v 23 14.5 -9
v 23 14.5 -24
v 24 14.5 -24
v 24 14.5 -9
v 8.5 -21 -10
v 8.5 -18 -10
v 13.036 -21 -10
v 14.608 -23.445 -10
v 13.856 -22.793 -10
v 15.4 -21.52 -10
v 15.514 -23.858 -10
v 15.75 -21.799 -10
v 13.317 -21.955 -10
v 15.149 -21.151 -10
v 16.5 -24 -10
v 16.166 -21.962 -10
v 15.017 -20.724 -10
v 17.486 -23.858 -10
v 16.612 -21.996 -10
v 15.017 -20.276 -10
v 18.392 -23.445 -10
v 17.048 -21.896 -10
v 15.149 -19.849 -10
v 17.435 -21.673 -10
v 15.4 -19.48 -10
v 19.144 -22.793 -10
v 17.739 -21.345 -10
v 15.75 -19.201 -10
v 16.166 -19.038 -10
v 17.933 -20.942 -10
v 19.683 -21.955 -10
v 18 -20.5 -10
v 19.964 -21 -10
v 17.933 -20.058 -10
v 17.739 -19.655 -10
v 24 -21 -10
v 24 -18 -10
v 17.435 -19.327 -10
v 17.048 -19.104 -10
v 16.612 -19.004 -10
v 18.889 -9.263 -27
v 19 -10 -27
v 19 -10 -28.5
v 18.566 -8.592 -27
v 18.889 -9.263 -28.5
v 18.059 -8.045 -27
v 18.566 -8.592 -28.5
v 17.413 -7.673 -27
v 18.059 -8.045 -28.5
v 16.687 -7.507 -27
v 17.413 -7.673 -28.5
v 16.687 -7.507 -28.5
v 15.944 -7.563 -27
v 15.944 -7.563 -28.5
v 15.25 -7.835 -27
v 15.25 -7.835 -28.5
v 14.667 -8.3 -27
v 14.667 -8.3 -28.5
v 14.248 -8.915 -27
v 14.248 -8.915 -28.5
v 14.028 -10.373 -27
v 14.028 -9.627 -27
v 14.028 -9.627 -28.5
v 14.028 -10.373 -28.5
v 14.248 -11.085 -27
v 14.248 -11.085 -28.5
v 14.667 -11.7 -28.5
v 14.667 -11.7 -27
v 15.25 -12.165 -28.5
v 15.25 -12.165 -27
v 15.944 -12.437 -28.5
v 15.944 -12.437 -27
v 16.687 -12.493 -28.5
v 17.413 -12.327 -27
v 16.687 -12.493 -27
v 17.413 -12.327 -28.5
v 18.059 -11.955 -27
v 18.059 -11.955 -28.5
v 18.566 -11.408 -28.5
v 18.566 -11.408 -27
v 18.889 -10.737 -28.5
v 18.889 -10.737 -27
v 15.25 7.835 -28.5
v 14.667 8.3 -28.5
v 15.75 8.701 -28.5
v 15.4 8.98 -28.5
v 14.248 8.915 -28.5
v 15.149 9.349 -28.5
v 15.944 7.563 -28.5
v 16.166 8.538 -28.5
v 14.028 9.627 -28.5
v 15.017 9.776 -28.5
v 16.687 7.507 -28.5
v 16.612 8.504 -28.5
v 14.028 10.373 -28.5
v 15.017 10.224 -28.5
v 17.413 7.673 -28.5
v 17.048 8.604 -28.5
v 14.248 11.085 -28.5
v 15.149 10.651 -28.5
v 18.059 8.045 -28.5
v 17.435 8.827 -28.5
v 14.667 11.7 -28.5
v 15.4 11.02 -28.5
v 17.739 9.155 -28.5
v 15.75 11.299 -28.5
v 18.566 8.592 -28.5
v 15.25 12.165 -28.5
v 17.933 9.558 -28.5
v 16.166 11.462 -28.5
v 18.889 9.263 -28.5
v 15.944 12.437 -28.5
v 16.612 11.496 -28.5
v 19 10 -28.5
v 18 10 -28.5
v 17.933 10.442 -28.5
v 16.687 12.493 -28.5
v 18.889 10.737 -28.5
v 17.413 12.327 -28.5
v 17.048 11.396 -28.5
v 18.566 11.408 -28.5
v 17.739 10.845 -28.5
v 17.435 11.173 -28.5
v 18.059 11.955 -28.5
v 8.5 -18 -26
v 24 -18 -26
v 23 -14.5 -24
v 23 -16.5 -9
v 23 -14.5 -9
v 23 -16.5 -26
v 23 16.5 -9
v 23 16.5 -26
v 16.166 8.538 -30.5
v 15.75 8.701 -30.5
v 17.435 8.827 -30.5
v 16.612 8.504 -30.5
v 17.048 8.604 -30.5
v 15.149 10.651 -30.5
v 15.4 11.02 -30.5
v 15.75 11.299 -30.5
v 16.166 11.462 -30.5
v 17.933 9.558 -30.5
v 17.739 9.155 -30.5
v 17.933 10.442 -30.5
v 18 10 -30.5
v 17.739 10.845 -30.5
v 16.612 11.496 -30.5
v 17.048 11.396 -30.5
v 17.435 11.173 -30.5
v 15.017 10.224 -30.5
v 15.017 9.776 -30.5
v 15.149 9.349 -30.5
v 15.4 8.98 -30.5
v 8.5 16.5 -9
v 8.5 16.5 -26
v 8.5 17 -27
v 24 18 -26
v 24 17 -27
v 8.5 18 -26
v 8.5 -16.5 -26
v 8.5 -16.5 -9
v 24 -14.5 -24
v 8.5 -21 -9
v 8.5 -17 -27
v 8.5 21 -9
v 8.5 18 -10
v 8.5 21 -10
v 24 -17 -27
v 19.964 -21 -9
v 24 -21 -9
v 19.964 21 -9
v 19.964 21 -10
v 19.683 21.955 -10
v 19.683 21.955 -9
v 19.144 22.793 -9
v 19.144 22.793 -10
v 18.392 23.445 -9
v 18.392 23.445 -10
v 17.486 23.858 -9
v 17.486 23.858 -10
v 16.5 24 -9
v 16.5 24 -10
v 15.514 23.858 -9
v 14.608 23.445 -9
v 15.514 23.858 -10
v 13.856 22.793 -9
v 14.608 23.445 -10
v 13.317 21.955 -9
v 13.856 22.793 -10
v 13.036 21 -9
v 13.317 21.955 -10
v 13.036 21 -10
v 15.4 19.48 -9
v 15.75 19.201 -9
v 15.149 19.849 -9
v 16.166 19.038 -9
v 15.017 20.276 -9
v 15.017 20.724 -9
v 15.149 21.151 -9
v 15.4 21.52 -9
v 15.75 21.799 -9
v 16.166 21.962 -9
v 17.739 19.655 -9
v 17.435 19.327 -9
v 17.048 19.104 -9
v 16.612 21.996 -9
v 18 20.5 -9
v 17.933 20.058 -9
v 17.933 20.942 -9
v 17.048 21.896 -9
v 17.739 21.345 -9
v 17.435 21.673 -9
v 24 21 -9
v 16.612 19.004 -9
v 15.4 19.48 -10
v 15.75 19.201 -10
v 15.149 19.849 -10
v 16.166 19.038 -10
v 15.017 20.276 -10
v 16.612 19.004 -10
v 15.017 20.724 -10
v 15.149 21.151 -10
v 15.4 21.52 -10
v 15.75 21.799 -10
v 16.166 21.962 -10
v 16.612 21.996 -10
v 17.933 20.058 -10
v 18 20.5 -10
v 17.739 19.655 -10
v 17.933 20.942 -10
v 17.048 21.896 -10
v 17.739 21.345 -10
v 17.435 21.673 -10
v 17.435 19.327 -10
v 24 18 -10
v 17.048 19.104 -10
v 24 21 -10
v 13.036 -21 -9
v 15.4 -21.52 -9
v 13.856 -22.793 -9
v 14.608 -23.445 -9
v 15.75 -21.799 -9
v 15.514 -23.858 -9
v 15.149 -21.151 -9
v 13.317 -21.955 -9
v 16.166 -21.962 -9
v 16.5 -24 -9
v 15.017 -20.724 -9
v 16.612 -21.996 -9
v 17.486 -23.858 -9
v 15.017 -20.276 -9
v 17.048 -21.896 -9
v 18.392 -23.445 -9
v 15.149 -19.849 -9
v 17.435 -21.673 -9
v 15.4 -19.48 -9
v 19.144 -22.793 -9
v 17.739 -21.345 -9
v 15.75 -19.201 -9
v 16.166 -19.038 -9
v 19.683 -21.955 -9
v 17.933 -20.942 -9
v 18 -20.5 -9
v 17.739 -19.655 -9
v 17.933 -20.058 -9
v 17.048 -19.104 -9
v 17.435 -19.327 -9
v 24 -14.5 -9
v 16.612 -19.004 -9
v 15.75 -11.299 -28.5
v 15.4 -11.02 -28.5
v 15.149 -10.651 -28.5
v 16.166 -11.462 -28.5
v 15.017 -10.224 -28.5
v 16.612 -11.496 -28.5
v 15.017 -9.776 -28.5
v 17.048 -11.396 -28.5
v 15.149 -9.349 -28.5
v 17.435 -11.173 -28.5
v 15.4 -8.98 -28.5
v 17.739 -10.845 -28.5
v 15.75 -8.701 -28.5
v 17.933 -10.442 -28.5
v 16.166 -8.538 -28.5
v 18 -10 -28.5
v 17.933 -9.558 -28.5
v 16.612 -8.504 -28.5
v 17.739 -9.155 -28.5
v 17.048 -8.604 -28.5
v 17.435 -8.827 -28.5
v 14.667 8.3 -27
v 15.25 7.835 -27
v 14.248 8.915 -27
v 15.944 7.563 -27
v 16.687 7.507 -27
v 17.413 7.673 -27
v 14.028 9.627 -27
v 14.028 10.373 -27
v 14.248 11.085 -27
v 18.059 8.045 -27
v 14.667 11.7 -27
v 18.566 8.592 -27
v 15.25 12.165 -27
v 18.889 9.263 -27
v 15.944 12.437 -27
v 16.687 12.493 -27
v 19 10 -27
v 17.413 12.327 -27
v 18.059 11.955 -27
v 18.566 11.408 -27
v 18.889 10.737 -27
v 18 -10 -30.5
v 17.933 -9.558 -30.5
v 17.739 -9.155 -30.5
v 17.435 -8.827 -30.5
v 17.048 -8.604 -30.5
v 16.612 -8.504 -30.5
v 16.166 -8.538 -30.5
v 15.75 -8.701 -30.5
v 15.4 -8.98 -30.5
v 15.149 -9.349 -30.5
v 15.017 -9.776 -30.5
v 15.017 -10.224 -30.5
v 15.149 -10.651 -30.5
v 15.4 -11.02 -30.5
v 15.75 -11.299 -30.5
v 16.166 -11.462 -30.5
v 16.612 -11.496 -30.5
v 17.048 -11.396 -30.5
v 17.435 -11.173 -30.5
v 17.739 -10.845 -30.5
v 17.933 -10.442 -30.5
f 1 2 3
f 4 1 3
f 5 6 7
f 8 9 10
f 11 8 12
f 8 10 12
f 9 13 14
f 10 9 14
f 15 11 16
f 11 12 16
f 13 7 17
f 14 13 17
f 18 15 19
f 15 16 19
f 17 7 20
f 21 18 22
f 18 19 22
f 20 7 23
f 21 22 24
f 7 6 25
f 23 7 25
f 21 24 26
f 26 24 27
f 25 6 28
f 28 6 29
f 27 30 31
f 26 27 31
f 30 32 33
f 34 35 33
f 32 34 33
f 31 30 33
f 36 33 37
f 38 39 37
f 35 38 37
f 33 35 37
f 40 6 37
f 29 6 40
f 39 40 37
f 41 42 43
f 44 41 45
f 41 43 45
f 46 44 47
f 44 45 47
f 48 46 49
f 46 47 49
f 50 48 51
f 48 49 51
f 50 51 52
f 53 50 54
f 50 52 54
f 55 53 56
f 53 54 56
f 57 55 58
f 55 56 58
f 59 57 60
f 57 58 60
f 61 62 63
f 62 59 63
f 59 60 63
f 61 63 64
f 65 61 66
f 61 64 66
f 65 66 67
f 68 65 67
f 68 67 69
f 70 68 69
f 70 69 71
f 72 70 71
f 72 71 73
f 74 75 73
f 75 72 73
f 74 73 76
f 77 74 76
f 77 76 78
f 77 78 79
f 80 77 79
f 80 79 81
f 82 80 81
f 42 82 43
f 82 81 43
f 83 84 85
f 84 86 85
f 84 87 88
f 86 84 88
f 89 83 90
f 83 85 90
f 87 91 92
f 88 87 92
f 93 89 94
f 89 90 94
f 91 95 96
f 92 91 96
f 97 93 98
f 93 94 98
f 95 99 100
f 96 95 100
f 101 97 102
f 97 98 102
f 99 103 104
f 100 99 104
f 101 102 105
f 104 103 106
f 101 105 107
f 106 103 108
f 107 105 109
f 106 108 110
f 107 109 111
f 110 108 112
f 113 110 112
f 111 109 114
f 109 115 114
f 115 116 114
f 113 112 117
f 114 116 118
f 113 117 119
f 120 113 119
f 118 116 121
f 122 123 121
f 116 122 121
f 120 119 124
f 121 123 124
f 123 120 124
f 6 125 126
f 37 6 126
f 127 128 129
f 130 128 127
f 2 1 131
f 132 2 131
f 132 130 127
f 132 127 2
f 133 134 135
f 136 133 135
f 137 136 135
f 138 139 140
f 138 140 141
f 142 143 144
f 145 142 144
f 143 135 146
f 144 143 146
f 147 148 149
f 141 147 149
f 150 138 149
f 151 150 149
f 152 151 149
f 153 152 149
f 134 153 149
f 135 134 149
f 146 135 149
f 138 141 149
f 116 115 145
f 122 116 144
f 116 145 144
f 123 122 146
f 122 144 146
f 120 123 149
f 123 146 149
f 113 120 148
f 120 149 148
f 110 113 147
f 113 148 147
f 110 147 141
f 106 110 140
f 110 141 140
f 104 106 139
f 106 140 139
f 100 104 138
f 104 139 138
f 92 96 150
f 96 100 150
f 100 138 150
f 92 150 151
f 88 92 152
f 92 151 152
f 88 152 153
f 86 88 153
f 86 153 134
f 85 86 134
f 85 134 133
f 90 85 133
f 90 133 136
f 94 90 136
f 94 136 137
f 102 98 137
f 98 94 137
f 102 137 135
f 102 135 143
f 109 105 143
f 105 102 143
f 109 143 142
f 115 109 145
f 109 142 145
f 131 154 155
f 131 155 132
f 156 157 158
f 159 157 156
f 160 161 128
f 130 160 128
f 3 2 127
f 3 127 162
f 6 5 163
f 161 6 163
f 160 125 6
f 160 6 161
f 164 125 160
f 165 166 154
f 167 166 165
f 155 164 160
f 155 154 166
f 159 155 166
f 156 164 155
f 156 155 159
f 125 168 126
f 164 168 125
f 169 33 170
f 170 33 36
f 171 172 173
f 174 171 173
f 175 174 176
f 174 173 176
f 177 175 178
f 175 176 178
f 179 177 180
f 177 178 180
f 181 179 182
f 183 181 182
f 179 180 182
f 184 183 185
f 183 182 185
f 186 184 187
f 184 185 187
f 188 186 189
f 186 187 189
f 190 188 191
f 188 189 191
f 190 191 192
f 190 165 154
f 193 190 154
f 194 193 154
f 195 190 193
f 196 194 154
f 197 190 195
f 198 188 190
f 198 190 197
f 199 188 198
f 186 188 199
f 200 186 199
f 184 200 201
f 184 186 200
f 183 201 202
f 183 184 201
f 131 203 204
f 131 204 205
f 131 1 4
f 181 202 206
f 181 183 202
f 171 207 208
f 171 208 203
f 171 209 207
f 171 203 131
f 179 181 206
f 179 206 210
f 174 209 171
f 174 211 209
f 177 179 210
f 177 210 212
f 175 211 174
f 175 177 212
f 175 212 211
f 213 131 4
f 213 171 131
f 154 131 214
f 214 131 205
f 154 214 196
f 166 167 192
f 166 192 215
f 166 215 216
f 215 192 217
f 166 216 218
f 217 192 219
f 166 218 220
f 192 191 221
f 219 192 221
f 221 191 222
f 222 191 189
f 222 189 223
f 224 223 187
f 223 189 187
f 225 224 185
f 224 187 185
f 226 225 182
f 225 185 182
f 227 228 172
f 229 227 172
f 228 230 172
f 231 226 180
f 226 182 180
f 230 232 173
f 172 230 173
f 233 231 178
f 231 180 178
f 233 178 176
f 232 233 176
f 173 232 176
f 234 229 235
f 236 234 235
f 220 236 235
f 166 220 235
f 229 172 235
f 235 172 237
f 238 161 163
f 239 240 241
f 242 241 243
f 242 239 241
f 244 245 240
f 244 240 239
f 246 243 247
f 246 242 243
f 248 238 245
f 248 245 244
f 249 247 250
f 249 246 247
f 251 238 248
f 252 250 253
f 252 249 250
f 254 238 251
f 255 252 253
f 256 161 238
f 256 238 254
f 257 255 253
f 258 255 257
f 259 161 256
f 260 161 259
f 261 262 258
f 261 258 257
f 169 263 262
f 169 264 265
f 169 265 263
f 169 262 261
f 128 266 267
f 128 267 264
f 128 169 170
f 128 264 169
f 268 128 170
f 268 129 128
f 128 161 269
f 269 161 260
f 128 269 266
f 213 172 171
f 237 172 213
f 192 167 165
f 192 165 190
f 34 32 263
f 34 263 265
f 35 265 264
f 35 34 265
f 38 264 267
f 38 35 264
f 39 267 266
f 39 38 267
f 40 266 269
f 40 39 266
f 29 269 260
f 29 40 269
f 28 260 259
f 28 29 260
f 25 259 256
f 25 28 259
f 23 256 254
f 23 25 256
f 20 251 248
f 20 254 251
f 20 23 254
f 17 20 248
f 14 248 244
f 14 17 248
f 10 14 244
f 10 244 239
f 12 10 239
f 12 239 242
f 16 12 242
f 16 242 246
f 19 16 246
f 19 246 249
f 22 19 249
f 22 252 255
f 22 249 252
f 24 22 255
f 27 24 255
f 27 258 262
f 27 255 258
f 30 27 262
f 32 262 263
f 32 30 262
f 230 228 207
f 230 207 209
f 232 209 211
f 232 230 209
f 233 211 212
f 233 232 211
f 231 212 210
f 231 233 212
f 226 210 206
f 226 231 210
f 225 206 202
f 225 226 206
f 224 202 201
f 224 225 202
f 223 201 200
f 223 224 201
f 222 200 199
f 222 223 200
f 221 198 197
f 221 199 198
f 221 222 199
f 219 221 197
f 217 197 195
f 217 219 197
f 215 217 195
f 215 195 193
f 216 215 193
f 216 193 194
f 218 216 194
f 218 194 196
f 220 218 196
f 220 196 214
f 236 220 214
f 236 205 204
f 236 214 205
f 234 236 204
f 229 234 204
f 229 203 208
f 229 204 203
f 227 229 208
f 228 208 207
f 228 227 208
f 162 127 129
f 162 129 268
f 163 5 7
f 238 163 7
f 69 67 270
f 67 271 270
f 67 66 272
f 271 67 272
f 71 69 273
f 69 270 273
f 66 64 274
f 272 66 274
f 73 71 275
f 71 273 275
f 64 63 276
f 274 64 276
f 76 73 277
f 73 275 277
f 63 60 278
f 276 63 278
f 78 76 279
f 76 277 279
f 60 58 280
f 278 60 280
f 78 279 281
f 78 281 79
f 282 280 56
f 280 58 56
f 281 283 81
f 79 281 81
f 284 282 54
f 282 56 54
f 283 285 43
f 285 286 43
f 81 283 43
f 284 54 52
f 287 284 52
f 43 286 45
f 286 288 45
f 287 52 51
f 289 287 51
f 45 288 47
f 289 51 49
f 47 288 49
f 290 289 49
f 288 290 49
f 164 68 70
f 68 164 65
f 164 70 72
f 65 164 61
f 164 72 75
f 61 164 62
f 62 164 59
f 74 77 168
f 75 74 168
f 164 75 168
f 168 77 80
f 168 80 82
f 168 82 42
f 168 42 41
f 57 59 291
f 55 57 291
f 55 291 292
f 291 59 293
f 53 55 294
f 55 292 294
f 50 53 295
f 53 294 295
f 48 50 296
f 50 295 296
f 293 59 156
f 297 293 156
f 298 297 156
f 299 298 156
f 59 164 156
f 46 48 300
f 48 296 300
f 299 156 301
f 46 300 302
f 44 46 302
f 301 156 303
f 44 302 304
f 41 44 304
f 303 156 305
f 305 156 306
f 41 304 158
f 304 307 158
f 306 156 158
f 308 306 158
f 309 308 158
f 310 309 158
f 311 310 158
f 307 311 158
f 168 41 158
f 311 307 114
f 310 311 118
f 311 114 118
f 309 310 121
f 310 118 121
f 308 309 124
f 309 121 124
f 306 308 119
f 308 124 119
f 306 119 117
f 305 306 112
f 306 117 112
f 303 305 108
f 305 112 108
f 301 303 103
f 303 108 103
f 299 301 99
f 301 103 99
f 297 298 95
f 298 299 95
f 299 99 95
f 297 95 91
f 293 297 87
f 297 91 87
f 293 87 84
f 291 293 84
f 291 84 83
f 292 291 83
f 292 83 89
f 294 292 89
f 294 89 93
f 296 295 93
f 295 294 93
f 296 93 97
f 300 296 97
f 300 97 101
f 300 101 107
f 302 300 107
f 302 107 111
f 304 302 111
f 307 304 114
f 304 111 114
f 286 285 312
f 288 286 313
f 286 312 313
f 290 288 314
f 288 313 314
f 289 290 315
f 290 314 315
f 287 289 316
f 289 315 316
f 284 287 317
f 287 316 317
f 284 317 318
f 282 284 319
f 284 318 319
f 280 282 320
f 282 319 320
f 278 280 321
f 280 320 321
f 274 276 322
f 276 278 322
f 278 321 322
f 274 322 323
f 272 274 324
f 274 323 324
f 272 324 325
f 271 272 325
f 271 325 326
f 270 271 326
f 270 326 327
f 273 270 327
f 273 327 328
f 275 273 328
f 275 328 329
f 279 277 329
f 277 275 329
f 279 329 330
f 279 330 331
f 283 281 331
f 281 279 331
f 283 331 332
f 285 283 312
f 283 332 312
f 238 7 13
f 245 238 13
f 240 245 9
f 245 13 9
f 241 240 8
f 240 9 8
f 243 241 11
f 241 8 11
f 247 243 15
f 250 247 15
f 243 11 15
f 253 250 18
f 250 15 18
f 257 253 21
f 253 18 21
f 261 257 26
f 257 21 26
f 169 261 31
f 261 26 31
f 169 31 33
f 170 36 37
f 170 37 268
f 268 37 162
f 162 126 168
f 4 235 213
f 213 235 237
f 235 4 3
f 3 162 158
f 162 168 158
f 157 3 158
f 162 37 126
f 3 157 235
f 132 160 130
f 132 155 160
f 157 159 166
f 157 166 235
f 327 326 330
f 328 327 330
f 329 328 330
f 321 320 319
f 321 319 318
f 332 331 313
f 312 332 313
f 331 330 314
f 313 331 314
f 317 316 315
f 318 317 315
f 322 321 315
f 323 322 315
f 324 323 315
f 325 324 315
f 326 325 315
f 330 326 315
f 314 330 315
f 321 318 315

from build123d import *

# Parameters (mm, degrees)
BOX035_W          = 10
BOX035_H          = 29
BOX035_DEPTH      = 15
CYLINDER046_R     = 1.5
CYLINDER046_DEPTH = 10
BOX022_W          = 22
BOX022_H          = 8
BOX022_DEPTH      = 21
CYLINDER041_R     = 1.5
CYLINDER041_DEPTH = 10
CYLINDER051_R     = 1.5
CYLINDER051_DEPTH = 10
CYLINDER052_R     = 1.5
CYLINDER052_DEPTH = 5
CYLINDER050_R     = 1.5
CYLINDER050_DEPTH = 10
CYLINDER054_R     = 3.5
CYLINDER054_DEPTH = 5
BOX024_W          = 32
BOX024_H          = 13
BOX024_DEPTH      = 2
CYLINDER055_R     = 6.5
CYLINDER055_DEPTH = 6
BOX025_W          = 23
BOX025_H          = 13
BOX025_DEPTH      = 23
CYLINDER056_R     = 1.5
CYLINDER056_DEPTH = 10
CYLINDER058_R     = 1.5
CYLINDER058_DEPTH = 5
CYLINDER057_R     = 1.5
CYLINDER057_DEPTH = 10
CYLINDER049_R     = 3.5
CYLINDER049_DEPTH = 5
BOX023_W          = 32
BOX023_H          = 13
BOX023_DEPTH      = 2
CYLINDER053_R     = 6.5
CYLINDER053_DEPTH = 6
BOX026_W          = 23
BOX026_H          = 13
BOX026_DEPTH      = 23
CYLINDER067_R     = 1.5
CYLINDER067_DEPTH = 10
CYLINDER071_R     = 1.5
CYLINDER071_DEPTH = 5
CYLINDER069_R     = 1.5
CYLINDER069_DEPTH = 10
CYLINDER061_R     = 3.5
CYLINDER061_DEPTH = 5
BOX032_W          = 32
BOX032_H          = 13
BOX032_DEPTH      = 2
CYLINDER073_R     = 6.5
CYLINDER073_DEPTH = 6
BOX033_W          = 23
BOX033_H          = 13
BOX033_DEPTH      = 23
CYLINDER065_R     = 1.5
CYLINDER065_DEPTH = 10
CYLINDER074_R     = 1.5
CYLINDER074_DEPTH = 5
CYLINDER070_R     = 1.5
CYLINDER070_DEPTH = 10
CYLINDER063_R     = 3.5
CYLINDER063_DEPTH = 5
BOX031_W          = 32
BOX031_H          = 13
BOX031_DEPTH      = 2
CYLINDER062_R     = 6.5
CYLINDER062_DEPTH = 6
BOX029_W          = 23
BOX029_H          = 13
BOX029_DEPTH      = 23
BOX021_W          = 17.5
BOX021_H          = 3.5
BOX021_DEPTH      = 18
BOX006_W          = 17.5
BOX006_H          = 3.5
BOX006_DEPTH      = 18
BOX020_W          = 15.5
BOX020_H          = 42
BOX020_DEPTH      = 18
CYLINDER042_R     = 3.5
CYLINDER042_DEPTH = 1
CYLINDER016_R     = 1.4
CYLINDER016_DEPTH = 2.5
CYLINDER015_R     = 1.4
CYLINDER015_DEPTH = 2.5
CYLINDER045_R     = 3.5
CYLINDER045_DEPTH = 1
CHAMFER019_SIZE   = 1
CYLINDER201_R     = 1.5
CYLINDER201_DEPTH = 2.5
CYLINDER203_R     = 2.5
CYLINDER203_DEPTH = 2.5
CYLINDER204_R     = 2.5
CYLINDER204_DEPTH = 2.5
CYLINDER202_R     = 1.5
CYLINDER202_DEPTH = 2.5


with BuildPart() as w_rfel035:
    # Box035 → Box035 (new body)
    with BuildSketch(Plane(origin=(22, -14.5, -24), x_dir=(1, 0, 0), z_dir=(0, 0, 1))):
        with Locations((5, 14.5)):
            Rectangle(BOX035_W, BOX035_H)
    extrude(amount=BOX035_DEPTH)


with BuildPart() as zylinder046:
    # Cylinder046 → Cylinder046 (new body)
    with BuildSketch(Plane(origin=(16.5, -20.5, -14), x_dir=(1, 0, 0), z_dir=(0, 0, 1))):
        Circle(CYLINDER046_R)
    extrude(amount=CYLINDER046_DEPTH)


with BuildPart() as w_rfel022:
    # Box022 → Box022 (new body)
    with BuildSketch(Plane(origin=(1, -4, -26), x_dir=(1, 0, 0), z_dir=(0, 0, 1))):
        with Locations((11, 4)):
            Rectangle(BOX022_W, BOX022_H)
    extrude(amount=BOX022_DEPTH)


with BuildPart() as fusion094:
    # Cylinder041 → Cylinder041 (new body)
    with BuildSketch(Plane(origin=(16.5, 20.5, -14), x_dir=(1, 0, 0), z_dir=(0, 0, 1))):
        Circle(CYLINDER041_R)
    extrude(amount=CYLINDER041_DEPTH)

    # Fusion021: union Zylinder046, Würfel022
    add(zylinder046.part)
    add(w_rfel022.part)

    # Fusion094: union Würfel035
    add(w_rfel035.part)


with BuildPart() as zylinder051:
    # Cylinder051 → Cylinder051 (new body)
    with BuildSketch(Plane(origin=(25.5, 6.5, 13), x_dir=(1, 0, 0), z_dir=(0, 0, 1))):
        Circle(CYLINDER051_R)
    extrude(amount=CYLINDER051_DEPTH)


with BuildPart() as zylinder052:
    # Cylinder052 → Cylinder052 (new body)
    with BuildSketch(Plane(origin=(16.5, 6.5, 30), x_dir=(1, 0, 0), z_dir=(0, 0, 1))):
        Circle(CYLINDER052_R)
    extrude(amount=CYLINDER052_DEPTH)


with BuildPart() as fusion025:
    # Cylinder050 → Cylinder050 (new body)
    with BuildSketch(Plane(origin=(-2.5, 6.5, 13), x_dir=(1, 0, 0), z_dir=(0, 0, 1))):
        Circle(CYLINDER050_R)
    extrude(amount=CYLINDER050_DEPTH)

    # Fusion025: union Zylinder051, Zylinder052
    add(zylinder051.part)
    add(zylinder052.part)


with BuildPart() as zylinder054:
    # Cylinder054 → Cylinder054 (new body)
    with BuildSketch(Plane(origin=(16.5, 6.5, 29), x_dir=(1, 0, 0), z_dir=(0, 0, 1))):
        Circle(CYLINDER054_R)
    extrude(amount=CYLINDER054_DEPTH)


with BuildPart() as w_rfel024:
    # Box024 → Box024 (new body)
    with BuildSketch(Plane(origin=(-4.5, 0, 18), x_dir=(1, 0, 0), z_dir=(0, 0, 1))):
        with Locations((16, 6.5)):
            Rectangle(BOX024_W, BOX024_H)
    extrude(amount=BOX024_DEPTH)


with BuildPart() as zylinder055:
    # Cylinder055 → Cylinder055 (new body)
    with BuildSketch(Plane(origin=(16.5, 6.5, 23), x_dir=(1, 0, 0), z_dir=(0, 0, 1))):
        Circle(CYLINDER055_R)
    extrude(amount=CYLINDER055_DEPTH)


with BuildPart() as servo2_mask001:
    # Box025 → Box025 (new body)
    with BuildSketch(Plane.XY):
        with Locations((11.5, 6.5)):
            Rectangle(BOX025_W, BOX025_H)
    extrude(amount=BOX025_DEPTH)

    # Fusion024: union Zylinder054, Würfel024, Zylinder055
    add(zylinder054.part)
    add(w_rfel024.part)
    add(zylinder055.part)

    # Cut012: cut Fusion025
    add(fusion025.part, mode=Mode.SUBTRACT)


with BuildPart() as servo2_mask001_1:
    # Cut012 placement: moved
    add(servo2_mask001.part.moved(Location((0, -16.5, -26))))


with BuildPart() as zylinder056:
    # Cylinder056 → Cylinder056 (new body)
    with BuildSketch(Plane(origin=(25.5, 6.5, 13), x_dir=(1, 0, 0), z_dir=(0, 0, 1))):
        Circle(CYLINDER056_R)
    extrude(amount=CYLINDER056_DEPTH)


with BuildPart() as zylinder058:
    # Cylinder058 → Cylinder058 (new body)
    with BuildSketch(Plane(origin=(16.5, 6.5, 30), x_dir=(1, 0, 0), z_dir=(0, 0, 1))):
        Circle(CYLINDER058_R)
    extrude(amount=CYLINDER058_DEPTH)


with BuildPart() as fusion026:
    # Cylinder057 → Cylinder057 (new body)
    with BuildSketch(Plane(origin=(-2.5, 6.5, 13), x_dir=(1, 0, 0), z_dir=(0, 0, 1))):
        Circle(CYLINDER057_R)
    extrude(amount=CYLINDER057_DEPTH)

    # Fusion026: union Zylinder056, Zylinder058
    add(zylinder056.part)
    add(zylinder058.part)


with BuildPart() as zylinder049:
    # Cylinder049 → Cylinder049 (new body)
    with BuildSketch(Plane(origin=(16.5, 6.5, 29), x_dir=(1, 0, 0), z_dir=(0, 0, 1))):
        Circle(CYLINDER049_R)
    extrude(amount=CYLINDER049_DEPTH)


with BuildPart() as w_rfel023:
    # Box023 → Box023 (new body)
    with BuildSketch(Plane(origin=(-4.5, 0, 18), x_dir=(1, 0, 0), z_dir=(0, 0, 1))):
        with Locations((16, 6.5)):
            Rectangle(BOX023_W, BOX023_H)
    extrude(amount=BOX023_DEPTH)


with BuildPart() as zylinder053:
    # Cylinder053 → Cylinder053 (new body)
    with BuildSketch(Plane(origin=(16.5, 6.5, 23), x_dir=(1, 0, 0), z_dir=(0, 0, 1))):
        Circle(CYLINDER053_R)
    extrude(amount=CYLINDER053_DEPTH)


with BuildPart() as fusion023:
    # Box026 → Box026 (new body)
    with BuildSketch(Plane.XY):
        with Locations((11.5, 6.5)):
            Rectangle(BOX026_W, BOX026_H)
    extrude(amount=BOX026_DEPTH)

    # Fusion027: union Zylinder049, Würfel023, Zylinder053
    add(zylinder049.part)
    add(w_rfel023.part)
    add(zylinder053.part)

    # Cut011: cut Fusion026
    add(fusion026.part, mode=Mode.SUBTRACT)


with BuildPart() as fusion023_1:
    # Cut011 placement: moved
    add(fusion023.part.moved(Location((0, 3.5, -26))))

    # Fusion023: union Servo2_mask001
    add(servo2_mask001_1.part)


with BuildPart() as zylinder067:
    # Cylinder067 → Cylinder067 (new body)
    with BuildSketch(Plane(origin=(25.5, 6.5, 13), x_dir=(1, 0, 0), z_dir=(0, 0, 1))):
        Circle(CYLINDER067_R)
    extrude(amount=CYLINDER067_DEPTH)


with BuildPart() as zylinder071:
    # Cylinder071 → Cylinder071 (new body)
    with BuildSketch(Plane(origin=(16.5, 6.5, 30), x_dir=(1, 0, 0), z_dir=(0, 0, 1))):
        Circle(CYLINDER071_R)
    extrude(amount=CYLINDER071_DEPTH)


with BuildPart() as fusion035:
    # Cylinder069 → Cylinder069 (new body)
    with BuildSketch(Plane(origin=(-2.5, 6.5, 13), x_dir=(1, 0, 0), z_dir=(0, 0, 1))):
        Circle(CYLINDER069_R)
    extrude(amount=CYLINDER069_DEPTH)

    # Fusion035: union Zylinder067, Zylinder071
    add(zylinder067.part)
    add(zylinder071.part)


with BuildPart() as zylinder061:
    # Cylinder061 → Cylinder061 (new body)
    with BuildSketch(Plane(origin=(16.5, 6.5, 29), x_dir=(1, 0, 0), z_dir=(0, 0, 1))):
        Circle(CYLINDER061_R)
    extrude(amount=CYLINDER061_DEPTH)


with BuildPart() as w_rfel032:
    # Box032 → Box032 (new body)
    with BuildSketch(Plane(origin=(-4.5, 0, 18), x_dir=(1, 0, 0), z_dir=(0, 0, 1))):
        with Locations((16, 6.5)):
            Rectangle(BOX032_W, BOX032_H)
    extrude(amount=BOX032_DEPTH)


with BuildPart() as zylinder073:
    # Cylinder073 → Cylinder073 (new body)
    with BuildSketch(Plane(origin=(16.5, 6.5, 23), x_dir=(1, 0, 0), z_dir=(0, 0, 1))):
        Circle(CYLINDER073_R)
    extrude(amount=CYLINDER073_DEPTH)


with BuildPart() as servo2_mask002:
    # Box033 → Box033 (new body)
    with BuildSketch(Plane.XY):
        with Locations((11.5, 6.5)):
            Rectangle(BOX033_W, BOX033_H)
    extrude(amount=BOX033_DEPTH)

    # Fusion033: union Zylinder061, Würfel032, Zylinder073
    add(zylinder061.part)
    add(w_rfel032.part)
    add(zylinder073.part)

    # Cut021: cut Fusion035
    add(fusion035.part, mode=Mode.SUBTRACT)


with BuildPart() as servo2_mask002_1:
    # Cut021 placement: moved
    add(servo2_mask002.part.moved(Location((0, -16.5, -26))))


with BuildPart() as zylinder065:
    # Cylinder065 → Cylinder065 (new body)
    with BuildSketch(Plane(origin=(25.5, 6.5, 13), x_dir=(1, 0, 0), z_dir=(0, 0, 1))):
        Circle(CYLINDER065_R)
    extrude(amount=CYLINDER065_DEPTH)


with BuildPart() as zylinder074:
    # Cylinder074 → Cylinder074 (new body)
    with BuildSketch(Plane(origin=(16.5, 6.5, 30), x_dir=(1, 0, 0), z_dir=(0, 0, 1))):
        Circle(CYLINDER074_R)
    extrude(amount=CYLINDER074_DEPTH)


with BuildPart() as fusion036:
    # Cylinder070 → Cylinder070 (new body)
    with BuildSketch(Plane(origin=(-2.5, 6.5, 13), x_dir=(1, 0, 0), z_dir=(0, 0, 1))):
        Circle(CYLINDER070_R)
    extrude(amount=CYLINDER070_DEPTH)

    # Fusion036: union Zylinder065, Zylinder074
    add(zylinder065.part)
    add(zylinder074.part)


with BuildPart() as zylinder063:
    # Cylinder063 → Cylinder063 (new body)
    with BuildSketch(Plane(origin=(16.5, 6.5, 29), x_dir=(1, 0, 0), z_dir=(0, 0, 1))):
        Circle(CYLINDER063_R)
    extrude(amount=CYLINDER063_DEPTH)


with BuildPart() as w_rfel031:
    # Box031 → Box031 (new body)
    with BuildSketch(Plane(origin=(-4.5, 0, 18), x_dir=(1, 0, 0), z_dir=(0, 0, 1))):
        with Locations((16, 6.5)):
            Rectangle(BOX031_W, BOX031_H)
    extrude(amount=BOX031_DEPTH)


with BuildPart() as zylinder062:
    # Cylinder062 → Cylinder062 (new body)
    with BuildSketch(Plane(origin=(16.5, 6.5, 23), x_dir=(1, 0, 0), z_dir=(0, 0, 1))):
        Circle(CYLINDER062_R)
    extrude(amount=CYLINDER062_DEPTH)


with BuildPart() as fusion096:
    # Box029 → Box029 (new body)
    with BuildSketch(Plane.XY):
        with Locations((11.5, 6.5)):
            Rectangle(BOX029_W, BOX029_H)
    extrude(amount=BOX029_DEPTH)

    # Fusion034: union Zylinder063, Würfel031, Zylinder062
    add(zylinder063.part)
    add(w_rfel031.part)
    add(zylinder062.part)

    # Cut016: cut Fusion036
    add(fusion036.part, mode=Mode.SUBTRACT)


with BuildPart() as fusion096_1:
    # Cut016 placement: moved
    add(fusion096.part.moved(Location((0, 3.5, -26))))

    # Fusion032: union Servo2_mask002
    add(servo2_mask002_1.part)

    # Fusion096: union Fusion094, Fusion023
    add(fusion094.part)
    add(fusion023_1.part)


with BuildPart() as w_rfel021:
    # Box021 → Box021 (new body)
    with BuildSketch(Plane(origin=(7.5, 18, -28), x_dir=(1, 0, 0), z_dir=(0, 0, 1))):
        with Locations((8.75, 1.75)):
            Rectangle(BOX021_W, BOX021_H)
    extrude(amount=BOX021_DEPTH)


with BuildPart() as fusion018:
    # Box006 → Box006 (new body)
    with BuildSketch(Plane(origin=(7.5, -21.5, -28), x_dir=(1, 0, 0), z_dir=(0, 0, 1))):
        with Locations((8.75, 1.75)):
            Rectangle(BOX006_W, BOX006_H)
    extrude(amount=BOX006_DEPTH)

    # Fusion018: union Würfel021
    add(w_rfel021.part)


with BuildPart() as cut009:
    # Box020 → Box020 (new body)
    with BuildSketch(Plane(origin=(8.5, -21, -27), x_dir=(1, 0, 0), z_dir=(0, 0, 1))):
        with Locations((7.75, 21)):
            Rectangle(BOX020_W, BOX020_H)
    extrude(amount=BOX020_DEPTH)

    # Cut009: cut Fusion018
    add(fusion018.part, mode=Mode.SUBTRACT)


with BuildPart() as zylinder042:
    # Cylinder042 → Cylinder042 (new body)
    with BuildSketch(Plane(origin=(16.5, 20.5, -10), x_dir=(1, 0, 0), z_dir=(0, 0, 1))):
        Circle(CYLINDER042_R)
    extrude(amount=CYLINDER042_DEPTH)


with BuildPart() as zylinder016:
    # Cylinder016 → Cylinder016 (new body)
    with BuildSketch(Plane(origin=(16.5, -10, -29.5), x_dir=(1, 0, 0), z_dir=(0, 0, 1))):
        Circle(CYLINDER016_R)
    extrude(amount=CYLINDER016_DEPTH)


with BuildPart() as zylinder015:
    # Cylinder015 → Cylinder015 (new body)
    with BuildSketch(Plane(origin=(16.5, 10, -29.5), x_dir=(1, 0, 0), z_dir=(0, 0, 1))):
        Circle(CYLINDER015_R)
    extrude(amount=CYLINDER015_DEPTH)


with BuildPart() as chamfer019:
    # Cylinder045 → Cylinder045 (new body)
    with BuildSketch(Plane(origin=(16.5, -20.5, -10), x_dir=(1, 0, 0), z_dir=(0, 0, 1))):
        Circle(CYLINDER045_R)
    extrude(amount=CYLINDER045_DEPTH)

    # Fusion019: union Zylinder042, Zylinder016, Zylinder015
    add(zylinder042.part)
    add(zylinder016.part)
    add(zylinder015.part)

    # Fusion095: union Cut009
    add(cut009.part)

    # Cut074: cut Fusion096
    add(fusion096_1.part, mode=Mode.SUBTRACT)

    # Chamfer019
    chamfer019_edges = [chamfer019.edges().sort_by_distance(p)[0] for p in [
        (16.25, -18, -27),
        (16.25, 18, -27),
    ]]
    chamfer(chamfer019_edges, length=CHAMFER019_SIZE)


with BuildPart() as zylinder201:
    # Cylinder201 → Cylinder201 (new body)
    with BuildSketch(Plane(origin=(16.5, -10, -30.5), x_dir=(1, 0, 0), z_dir=(0, 0, 1))):
        Circle(CYLINDER201_R)
    extrude(amount=CYLINDER201_DEPTH)


with BuildPart() as zylinder203:
    # Cylinder203 → Cylinder203 (new body)
    with BuildSketch(Plane(origin=(16.5, 10, -28.5), x_dir=(1, 0, 0), z_dir=(0, 0, 1))):
        Circle(CYLINDER203_R)
    extrude(amount=CYLINDER203_DEPTH)


with BuildPart() as zylinder204:
    # Cylinder204 → Cylinder204 (new body)
    with BuildSketch(Plane(origin=(16.5, -10, -28.5), x_dir=(1, 0, 0), z_dir=(0, 0, 1))):
        Circle(CYLINDER204_R)
    extrude(amount=CYLINDER204_DEPTH)


with BuildPart() as fusion133:
    # Cylinder202 → Cylinder202 (new body)
    with BuildSketch(Plane(origin=(16.5, 10, -30.5), x_dir=(1, 0, 0), z_dir=(0, 0, 1))):
        Circle(CYLINDER202_R)
    extrude(amount=CYLINDER202_DEPTH)

    # Fusion132: union Zylinder201, Zylinder203, Zylinder204
    add(zylinder201.part)
    add(zylinder203.part)
    add(zylinder204.part)

    # Fusion133: union Chamfer019
    add(chamfer019.part)


solid = fusion133.part
